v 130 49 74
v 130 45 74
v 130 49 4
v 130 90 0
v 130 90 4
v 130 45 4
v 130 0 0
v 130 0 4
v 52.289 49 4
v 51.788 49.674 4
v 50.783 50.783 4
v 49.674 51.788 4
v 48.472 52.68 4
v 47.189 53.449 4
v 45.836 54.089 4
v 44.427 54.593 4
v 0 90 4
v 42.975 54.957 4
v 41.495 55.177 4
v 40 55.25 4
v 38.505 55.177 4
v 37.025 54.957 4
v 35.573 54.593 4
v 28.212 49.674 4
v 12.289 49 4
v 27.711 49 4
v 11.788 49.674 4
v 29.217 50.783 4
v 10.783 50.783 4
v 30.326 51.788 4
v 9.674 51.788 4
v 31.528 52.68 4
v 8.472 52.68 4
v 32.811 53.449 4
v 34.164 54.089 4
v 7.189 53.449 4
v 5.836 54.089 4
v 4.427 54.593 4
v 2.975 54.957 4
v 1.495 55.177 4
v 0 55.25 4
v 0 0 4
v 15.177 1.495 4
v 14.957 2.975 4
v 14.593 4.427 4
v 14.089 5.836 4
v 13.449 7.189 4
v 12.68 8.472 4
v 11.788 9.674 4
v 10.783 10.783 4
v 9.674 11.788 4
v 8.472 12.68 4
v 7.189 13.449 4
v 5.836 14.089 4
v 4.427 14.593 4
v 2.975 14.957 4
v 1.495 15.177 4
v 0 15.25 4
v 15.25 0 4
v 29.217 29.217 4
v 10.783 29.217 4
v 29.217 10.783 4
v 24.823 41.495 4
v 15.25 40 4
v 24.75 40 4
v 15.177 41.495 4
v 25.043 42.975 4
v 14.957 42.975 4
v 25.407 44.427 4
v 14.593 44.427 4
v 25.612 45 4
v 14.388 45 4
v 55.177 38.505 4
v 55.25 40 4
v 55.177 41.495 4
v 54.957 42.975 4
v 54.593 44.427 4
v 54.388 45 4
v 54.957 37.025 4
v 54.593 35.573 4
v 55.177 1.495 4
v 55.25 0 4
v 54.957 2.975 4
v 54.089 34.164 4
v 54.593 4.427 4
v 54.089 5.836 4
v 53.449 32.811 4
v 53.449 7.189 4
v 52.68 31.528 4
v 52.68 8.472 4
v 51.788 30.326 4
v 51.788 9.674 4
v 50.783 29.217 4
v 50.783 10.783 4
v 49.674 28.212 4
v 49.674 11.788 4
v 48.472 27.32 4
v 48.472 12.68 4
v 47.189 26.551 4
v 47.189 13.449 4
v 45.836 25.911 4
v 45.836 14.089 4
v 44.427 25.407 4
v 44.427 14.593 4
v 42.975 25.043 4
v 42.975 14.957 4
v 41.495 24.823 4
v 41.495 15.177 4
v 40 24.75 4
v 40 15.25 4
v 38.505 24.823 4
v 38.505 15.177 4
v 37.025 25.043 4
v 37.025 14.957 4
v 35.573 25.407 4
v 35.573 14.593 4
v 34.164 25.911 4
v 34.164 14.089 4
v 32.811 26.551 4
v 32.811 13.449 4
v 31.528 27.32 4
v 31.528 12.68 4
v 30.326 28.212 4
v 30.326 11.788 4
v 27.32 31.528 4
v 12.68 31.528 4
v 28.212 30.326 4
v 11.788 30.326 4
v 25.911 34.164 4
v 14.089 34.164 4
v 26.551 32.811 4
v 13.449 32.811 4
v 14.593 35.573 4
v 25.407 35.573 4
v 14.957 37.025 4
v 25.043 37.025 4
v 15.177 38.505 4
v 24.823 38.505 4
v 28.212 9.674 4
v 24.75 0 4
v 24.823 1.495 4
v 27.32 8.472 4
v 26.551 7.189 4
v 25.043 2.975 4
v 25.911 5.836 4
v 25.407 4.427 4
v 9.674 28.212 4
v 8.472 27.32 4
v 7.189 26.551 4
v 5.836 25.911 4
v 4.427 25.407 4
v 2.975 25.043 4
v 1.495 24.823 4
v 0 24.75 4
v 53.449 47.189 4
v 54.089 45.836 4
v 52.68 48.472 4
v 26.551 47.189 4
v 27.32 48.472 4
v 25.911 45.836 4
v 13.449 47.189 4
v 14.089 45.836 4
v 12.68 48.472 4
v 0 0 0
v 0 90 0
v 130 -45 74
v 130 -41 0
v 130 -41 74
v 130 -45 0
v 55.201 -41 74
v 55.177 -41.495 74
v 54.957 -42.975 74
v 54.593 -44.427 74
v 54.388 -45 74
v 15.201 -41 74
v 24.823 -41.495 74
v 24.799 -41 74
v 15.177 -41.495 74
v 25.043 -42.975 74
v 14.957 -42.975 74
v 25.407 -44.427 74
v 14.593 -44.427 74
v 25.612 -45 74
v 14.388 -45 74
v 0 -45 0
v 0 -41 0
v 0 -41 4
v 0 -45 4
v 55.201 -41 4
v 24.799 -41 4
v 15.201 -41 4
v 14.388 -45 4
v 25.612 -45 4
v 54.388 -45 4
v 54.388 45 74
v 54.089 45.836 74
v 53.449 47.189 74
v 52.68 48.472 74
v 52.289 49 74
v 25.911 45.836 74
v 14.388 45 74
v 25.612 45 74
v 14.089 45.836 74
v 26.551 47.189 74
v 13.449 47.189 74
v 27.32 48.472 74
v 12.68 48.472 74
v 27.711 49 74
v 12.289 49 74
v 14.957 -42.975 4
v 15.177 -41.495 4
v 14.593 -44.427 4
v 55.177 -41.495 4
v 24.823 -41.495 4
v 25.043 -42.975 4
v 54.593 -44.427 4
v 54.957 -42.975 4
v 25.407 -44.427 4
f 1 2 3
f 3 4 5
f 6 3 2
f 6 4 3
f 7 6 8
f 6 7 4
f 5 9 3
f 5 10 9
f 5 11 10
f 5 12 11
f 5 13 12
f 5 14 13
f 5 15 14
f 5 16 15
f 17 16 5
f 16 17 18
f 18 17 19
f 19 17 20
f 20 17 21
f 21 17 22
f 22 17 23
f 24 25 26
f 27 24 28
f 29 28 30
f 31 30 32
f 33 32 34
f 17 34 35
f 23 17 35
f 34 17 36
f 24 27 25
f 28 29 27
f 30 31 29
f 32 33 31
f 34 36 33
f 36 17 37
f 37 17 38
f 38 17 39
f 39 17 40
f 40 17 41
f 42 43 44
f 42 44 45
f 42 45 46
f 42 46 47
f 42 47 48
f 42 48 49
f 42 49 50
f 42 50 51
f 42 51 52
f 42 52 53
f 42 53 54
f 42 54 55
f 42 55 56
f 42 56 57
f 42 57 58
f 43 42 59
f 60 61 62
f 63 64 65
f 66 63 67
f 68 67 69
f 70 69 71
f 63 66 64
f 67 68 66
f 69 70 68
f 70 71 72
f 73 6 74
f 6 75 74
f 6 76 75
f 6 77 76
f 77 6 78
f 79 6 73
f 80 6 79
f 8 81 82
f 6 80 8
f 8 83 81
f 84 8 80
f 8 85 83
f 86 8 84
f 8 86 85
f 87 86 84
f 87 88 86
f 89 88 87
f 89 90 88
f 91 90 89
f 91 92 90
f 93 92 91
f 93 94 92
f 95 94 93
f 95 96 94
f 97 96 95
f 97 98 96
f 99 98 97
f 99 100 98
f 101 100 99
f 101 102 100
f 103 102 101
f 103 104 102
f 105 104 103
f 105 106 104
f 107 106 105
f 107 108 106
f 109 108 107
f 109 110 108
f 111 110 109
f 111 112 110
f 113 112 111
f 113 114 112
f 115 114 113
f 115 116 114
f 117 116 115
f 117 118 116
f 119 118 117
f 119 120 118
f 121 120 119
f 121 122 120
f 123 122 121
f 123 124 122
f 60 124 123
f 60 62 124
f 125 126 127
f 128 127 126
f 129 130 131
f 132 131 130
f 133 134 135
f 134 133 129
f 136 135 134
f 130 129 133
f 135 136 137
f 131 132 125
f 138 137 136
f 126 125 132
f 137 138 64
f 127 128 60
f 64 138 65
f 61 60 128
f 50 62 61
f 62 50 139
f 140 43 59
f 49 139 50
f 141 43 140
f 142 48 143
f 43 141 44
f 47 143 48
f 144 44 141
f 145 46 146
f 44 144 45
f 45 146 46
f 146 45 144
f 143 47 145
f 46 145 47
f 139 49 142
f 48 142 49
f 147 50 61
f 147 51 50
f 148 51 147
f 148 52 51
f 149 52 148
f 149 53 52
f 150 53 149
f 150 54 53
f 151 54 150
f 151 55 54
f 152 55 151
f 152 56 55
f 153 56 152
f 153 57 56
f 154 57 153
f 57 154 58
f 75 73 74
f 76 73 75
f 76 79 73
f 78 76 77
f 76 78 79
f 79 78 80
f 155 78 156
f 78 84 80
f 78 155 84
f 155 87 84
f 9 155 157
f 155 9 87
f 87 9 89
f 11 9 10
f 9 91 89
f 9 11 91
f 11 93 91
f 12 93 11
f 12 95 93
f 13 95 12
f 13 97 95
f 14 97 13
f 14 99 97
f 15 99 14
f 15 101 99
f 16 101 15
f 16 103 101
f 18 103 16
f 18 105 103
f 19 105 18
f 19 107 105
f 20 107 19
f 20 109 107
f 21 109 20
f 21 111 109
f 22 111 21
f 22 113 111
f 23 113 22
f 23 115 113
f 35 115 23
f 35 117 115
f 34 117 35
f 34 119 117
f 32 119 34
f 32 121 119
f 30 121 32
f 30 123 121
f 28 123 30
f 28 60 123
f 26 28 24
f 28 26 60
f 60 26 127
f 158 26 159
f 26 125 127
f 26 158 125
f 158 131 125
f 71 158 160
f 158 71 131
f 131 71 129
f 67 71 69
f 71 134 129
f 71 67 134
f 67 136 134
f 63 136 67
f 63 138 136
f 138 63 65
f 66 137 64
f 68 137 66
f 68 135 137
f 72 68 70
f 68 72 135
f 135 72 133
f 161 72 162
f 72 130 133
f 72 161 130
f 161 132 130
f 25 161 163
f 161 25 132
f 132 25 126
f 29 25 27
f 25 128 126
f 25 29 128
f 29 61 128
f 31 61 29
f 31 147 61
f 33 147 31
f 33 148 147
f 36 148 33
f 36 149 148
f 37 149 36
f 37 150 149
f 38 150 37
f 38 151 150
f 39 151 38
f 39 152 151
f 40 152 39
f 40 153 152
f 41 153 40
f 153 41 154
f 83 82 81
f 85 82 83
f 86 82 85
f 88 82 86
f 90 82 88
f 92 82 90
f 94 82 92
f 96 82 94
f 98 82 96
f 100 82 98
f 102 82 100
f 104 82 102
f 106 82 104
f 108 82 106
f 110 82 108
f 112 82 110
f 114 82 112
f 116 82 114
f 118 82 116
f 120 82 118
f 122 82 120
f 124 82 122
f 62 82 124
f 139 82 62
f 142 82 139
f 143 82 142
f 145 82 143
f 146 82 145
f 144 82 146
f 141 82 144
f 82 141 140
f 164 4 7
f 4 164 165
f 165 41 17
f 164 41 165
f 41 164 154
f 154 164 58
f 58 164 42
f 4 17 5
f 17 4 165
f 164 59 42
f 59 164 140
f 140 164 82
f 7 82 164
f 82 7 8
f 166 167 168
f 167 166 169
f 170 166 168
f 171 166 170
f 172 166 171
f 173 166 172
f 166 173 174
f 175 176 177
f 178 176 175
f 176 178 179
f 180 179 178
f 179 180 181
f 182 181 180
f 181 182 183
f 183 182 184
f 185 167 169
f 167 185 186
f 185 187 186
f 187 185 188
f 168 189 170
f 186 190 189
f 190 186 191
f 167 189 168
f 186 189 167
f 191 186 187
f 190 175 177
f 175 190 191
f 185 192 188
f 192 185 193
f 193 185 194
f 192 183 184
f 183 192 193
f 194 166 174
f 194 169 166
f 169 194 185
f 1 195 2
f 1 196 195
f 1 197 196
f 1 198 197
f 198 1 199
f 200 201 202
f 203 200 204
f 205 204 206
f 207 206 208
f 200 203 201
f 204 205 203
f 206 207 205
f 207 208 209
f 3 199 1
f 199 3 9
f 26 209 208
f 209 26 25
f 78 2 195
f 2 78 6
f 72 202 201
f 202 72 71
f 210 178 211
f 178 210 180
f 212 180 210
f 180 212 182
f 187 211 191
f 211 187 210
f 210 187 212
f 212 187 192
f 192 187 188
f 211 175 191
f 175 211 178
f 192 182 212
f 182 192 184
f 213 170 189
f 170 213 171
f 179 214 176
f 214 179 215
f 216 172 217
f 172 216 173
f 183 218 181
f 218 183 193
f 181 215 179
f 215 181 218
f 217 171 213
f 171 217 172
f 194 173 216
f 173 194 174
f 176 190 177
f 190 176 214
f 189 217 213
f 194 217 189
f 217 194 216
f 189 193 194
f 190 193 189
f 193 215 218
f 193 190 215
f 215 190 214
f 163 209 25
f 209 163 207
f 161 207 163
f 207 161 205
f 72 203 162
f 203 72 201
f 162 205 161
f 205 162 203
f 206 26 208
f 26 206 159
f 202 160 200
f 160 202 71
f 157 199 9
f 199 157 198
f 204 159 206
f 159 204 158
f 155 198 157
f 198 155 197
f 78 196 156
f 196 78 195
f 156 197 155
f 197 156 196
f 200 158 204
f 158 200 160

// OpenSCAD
// Rack for six 50 mL conical (Falcon-type) tubes.
// Print orientation: Flat plate on bed (z=0), walls rising to z=70.
// After printing, flip over so walls are on the bed and tubes hang down.

// Plate dimensions
L     = 130; // Length (X)
W     = 90;  // Width (Y)
t     = 4;   // Plate thickness (Z)

// Hole specifications
n_holes = 6;
hole_d  = 30.5; // Diameter

// Grid layout
row_spacing = 40; // Centre-to-centre Y
col_spacing = 40; // Centre-to-centre X

// Wall specifications
wall_h = 70; // Height of walls from plate top (z=4)
wall_t = 4;  // Thickness of walls (Y)

// Derived positions
// The plate is centred on the origin.
// X range: -65 to +65
// Y range: -45 to +45
// Plate top surface is at z = t.

$fn = 64;

// Define the main body (Plate + Walls)
module rack_body() {
    // 1. The flat plate, centred on origin
    translate([0, 0, 0]) cube([L, W, t]);

    // 2. The two side walls
    // Left wall (at Y = -W/2)
    translate([0, -W/2, 0]) cube([L, wall_t, wall_h + t]);
    // Right wall (at Y = +W/2)
    translate([0, W/2, 0]) cube([L, wall_t, wall_h + t]);
}

// Define the holes
module holes() {
    // Calculate positions relative to the plate top (z=t)
    // We subtract t from the Z coordinate of the cutting cylinder so it starts at the plate surface
    // and goes down (negative Z) to cut through.
    
    // Y positions for 3 rows: -40, 0, 40 (centred on Y=0)
    y_pos = [-40, 0, 40];
    // X positions for 3 cols: -40, 0, 40 (centred on X=0)
    x_pos = [-40, 0, 40];

    for (y = y_pos) {
        for (x = x_pos) {
            // Cut a cylinder through the plate and walls
            // The cylinder must extend slightly past the plate thickness to ensure clean cut
            // and past the wall height.
            translate([x, y, t]) 
                cylinder(h = wall_h + t + 1, d = hole_d);
        }
    }
}

difference() {
    union() {
        rack_body();
    }
    holes();
}
